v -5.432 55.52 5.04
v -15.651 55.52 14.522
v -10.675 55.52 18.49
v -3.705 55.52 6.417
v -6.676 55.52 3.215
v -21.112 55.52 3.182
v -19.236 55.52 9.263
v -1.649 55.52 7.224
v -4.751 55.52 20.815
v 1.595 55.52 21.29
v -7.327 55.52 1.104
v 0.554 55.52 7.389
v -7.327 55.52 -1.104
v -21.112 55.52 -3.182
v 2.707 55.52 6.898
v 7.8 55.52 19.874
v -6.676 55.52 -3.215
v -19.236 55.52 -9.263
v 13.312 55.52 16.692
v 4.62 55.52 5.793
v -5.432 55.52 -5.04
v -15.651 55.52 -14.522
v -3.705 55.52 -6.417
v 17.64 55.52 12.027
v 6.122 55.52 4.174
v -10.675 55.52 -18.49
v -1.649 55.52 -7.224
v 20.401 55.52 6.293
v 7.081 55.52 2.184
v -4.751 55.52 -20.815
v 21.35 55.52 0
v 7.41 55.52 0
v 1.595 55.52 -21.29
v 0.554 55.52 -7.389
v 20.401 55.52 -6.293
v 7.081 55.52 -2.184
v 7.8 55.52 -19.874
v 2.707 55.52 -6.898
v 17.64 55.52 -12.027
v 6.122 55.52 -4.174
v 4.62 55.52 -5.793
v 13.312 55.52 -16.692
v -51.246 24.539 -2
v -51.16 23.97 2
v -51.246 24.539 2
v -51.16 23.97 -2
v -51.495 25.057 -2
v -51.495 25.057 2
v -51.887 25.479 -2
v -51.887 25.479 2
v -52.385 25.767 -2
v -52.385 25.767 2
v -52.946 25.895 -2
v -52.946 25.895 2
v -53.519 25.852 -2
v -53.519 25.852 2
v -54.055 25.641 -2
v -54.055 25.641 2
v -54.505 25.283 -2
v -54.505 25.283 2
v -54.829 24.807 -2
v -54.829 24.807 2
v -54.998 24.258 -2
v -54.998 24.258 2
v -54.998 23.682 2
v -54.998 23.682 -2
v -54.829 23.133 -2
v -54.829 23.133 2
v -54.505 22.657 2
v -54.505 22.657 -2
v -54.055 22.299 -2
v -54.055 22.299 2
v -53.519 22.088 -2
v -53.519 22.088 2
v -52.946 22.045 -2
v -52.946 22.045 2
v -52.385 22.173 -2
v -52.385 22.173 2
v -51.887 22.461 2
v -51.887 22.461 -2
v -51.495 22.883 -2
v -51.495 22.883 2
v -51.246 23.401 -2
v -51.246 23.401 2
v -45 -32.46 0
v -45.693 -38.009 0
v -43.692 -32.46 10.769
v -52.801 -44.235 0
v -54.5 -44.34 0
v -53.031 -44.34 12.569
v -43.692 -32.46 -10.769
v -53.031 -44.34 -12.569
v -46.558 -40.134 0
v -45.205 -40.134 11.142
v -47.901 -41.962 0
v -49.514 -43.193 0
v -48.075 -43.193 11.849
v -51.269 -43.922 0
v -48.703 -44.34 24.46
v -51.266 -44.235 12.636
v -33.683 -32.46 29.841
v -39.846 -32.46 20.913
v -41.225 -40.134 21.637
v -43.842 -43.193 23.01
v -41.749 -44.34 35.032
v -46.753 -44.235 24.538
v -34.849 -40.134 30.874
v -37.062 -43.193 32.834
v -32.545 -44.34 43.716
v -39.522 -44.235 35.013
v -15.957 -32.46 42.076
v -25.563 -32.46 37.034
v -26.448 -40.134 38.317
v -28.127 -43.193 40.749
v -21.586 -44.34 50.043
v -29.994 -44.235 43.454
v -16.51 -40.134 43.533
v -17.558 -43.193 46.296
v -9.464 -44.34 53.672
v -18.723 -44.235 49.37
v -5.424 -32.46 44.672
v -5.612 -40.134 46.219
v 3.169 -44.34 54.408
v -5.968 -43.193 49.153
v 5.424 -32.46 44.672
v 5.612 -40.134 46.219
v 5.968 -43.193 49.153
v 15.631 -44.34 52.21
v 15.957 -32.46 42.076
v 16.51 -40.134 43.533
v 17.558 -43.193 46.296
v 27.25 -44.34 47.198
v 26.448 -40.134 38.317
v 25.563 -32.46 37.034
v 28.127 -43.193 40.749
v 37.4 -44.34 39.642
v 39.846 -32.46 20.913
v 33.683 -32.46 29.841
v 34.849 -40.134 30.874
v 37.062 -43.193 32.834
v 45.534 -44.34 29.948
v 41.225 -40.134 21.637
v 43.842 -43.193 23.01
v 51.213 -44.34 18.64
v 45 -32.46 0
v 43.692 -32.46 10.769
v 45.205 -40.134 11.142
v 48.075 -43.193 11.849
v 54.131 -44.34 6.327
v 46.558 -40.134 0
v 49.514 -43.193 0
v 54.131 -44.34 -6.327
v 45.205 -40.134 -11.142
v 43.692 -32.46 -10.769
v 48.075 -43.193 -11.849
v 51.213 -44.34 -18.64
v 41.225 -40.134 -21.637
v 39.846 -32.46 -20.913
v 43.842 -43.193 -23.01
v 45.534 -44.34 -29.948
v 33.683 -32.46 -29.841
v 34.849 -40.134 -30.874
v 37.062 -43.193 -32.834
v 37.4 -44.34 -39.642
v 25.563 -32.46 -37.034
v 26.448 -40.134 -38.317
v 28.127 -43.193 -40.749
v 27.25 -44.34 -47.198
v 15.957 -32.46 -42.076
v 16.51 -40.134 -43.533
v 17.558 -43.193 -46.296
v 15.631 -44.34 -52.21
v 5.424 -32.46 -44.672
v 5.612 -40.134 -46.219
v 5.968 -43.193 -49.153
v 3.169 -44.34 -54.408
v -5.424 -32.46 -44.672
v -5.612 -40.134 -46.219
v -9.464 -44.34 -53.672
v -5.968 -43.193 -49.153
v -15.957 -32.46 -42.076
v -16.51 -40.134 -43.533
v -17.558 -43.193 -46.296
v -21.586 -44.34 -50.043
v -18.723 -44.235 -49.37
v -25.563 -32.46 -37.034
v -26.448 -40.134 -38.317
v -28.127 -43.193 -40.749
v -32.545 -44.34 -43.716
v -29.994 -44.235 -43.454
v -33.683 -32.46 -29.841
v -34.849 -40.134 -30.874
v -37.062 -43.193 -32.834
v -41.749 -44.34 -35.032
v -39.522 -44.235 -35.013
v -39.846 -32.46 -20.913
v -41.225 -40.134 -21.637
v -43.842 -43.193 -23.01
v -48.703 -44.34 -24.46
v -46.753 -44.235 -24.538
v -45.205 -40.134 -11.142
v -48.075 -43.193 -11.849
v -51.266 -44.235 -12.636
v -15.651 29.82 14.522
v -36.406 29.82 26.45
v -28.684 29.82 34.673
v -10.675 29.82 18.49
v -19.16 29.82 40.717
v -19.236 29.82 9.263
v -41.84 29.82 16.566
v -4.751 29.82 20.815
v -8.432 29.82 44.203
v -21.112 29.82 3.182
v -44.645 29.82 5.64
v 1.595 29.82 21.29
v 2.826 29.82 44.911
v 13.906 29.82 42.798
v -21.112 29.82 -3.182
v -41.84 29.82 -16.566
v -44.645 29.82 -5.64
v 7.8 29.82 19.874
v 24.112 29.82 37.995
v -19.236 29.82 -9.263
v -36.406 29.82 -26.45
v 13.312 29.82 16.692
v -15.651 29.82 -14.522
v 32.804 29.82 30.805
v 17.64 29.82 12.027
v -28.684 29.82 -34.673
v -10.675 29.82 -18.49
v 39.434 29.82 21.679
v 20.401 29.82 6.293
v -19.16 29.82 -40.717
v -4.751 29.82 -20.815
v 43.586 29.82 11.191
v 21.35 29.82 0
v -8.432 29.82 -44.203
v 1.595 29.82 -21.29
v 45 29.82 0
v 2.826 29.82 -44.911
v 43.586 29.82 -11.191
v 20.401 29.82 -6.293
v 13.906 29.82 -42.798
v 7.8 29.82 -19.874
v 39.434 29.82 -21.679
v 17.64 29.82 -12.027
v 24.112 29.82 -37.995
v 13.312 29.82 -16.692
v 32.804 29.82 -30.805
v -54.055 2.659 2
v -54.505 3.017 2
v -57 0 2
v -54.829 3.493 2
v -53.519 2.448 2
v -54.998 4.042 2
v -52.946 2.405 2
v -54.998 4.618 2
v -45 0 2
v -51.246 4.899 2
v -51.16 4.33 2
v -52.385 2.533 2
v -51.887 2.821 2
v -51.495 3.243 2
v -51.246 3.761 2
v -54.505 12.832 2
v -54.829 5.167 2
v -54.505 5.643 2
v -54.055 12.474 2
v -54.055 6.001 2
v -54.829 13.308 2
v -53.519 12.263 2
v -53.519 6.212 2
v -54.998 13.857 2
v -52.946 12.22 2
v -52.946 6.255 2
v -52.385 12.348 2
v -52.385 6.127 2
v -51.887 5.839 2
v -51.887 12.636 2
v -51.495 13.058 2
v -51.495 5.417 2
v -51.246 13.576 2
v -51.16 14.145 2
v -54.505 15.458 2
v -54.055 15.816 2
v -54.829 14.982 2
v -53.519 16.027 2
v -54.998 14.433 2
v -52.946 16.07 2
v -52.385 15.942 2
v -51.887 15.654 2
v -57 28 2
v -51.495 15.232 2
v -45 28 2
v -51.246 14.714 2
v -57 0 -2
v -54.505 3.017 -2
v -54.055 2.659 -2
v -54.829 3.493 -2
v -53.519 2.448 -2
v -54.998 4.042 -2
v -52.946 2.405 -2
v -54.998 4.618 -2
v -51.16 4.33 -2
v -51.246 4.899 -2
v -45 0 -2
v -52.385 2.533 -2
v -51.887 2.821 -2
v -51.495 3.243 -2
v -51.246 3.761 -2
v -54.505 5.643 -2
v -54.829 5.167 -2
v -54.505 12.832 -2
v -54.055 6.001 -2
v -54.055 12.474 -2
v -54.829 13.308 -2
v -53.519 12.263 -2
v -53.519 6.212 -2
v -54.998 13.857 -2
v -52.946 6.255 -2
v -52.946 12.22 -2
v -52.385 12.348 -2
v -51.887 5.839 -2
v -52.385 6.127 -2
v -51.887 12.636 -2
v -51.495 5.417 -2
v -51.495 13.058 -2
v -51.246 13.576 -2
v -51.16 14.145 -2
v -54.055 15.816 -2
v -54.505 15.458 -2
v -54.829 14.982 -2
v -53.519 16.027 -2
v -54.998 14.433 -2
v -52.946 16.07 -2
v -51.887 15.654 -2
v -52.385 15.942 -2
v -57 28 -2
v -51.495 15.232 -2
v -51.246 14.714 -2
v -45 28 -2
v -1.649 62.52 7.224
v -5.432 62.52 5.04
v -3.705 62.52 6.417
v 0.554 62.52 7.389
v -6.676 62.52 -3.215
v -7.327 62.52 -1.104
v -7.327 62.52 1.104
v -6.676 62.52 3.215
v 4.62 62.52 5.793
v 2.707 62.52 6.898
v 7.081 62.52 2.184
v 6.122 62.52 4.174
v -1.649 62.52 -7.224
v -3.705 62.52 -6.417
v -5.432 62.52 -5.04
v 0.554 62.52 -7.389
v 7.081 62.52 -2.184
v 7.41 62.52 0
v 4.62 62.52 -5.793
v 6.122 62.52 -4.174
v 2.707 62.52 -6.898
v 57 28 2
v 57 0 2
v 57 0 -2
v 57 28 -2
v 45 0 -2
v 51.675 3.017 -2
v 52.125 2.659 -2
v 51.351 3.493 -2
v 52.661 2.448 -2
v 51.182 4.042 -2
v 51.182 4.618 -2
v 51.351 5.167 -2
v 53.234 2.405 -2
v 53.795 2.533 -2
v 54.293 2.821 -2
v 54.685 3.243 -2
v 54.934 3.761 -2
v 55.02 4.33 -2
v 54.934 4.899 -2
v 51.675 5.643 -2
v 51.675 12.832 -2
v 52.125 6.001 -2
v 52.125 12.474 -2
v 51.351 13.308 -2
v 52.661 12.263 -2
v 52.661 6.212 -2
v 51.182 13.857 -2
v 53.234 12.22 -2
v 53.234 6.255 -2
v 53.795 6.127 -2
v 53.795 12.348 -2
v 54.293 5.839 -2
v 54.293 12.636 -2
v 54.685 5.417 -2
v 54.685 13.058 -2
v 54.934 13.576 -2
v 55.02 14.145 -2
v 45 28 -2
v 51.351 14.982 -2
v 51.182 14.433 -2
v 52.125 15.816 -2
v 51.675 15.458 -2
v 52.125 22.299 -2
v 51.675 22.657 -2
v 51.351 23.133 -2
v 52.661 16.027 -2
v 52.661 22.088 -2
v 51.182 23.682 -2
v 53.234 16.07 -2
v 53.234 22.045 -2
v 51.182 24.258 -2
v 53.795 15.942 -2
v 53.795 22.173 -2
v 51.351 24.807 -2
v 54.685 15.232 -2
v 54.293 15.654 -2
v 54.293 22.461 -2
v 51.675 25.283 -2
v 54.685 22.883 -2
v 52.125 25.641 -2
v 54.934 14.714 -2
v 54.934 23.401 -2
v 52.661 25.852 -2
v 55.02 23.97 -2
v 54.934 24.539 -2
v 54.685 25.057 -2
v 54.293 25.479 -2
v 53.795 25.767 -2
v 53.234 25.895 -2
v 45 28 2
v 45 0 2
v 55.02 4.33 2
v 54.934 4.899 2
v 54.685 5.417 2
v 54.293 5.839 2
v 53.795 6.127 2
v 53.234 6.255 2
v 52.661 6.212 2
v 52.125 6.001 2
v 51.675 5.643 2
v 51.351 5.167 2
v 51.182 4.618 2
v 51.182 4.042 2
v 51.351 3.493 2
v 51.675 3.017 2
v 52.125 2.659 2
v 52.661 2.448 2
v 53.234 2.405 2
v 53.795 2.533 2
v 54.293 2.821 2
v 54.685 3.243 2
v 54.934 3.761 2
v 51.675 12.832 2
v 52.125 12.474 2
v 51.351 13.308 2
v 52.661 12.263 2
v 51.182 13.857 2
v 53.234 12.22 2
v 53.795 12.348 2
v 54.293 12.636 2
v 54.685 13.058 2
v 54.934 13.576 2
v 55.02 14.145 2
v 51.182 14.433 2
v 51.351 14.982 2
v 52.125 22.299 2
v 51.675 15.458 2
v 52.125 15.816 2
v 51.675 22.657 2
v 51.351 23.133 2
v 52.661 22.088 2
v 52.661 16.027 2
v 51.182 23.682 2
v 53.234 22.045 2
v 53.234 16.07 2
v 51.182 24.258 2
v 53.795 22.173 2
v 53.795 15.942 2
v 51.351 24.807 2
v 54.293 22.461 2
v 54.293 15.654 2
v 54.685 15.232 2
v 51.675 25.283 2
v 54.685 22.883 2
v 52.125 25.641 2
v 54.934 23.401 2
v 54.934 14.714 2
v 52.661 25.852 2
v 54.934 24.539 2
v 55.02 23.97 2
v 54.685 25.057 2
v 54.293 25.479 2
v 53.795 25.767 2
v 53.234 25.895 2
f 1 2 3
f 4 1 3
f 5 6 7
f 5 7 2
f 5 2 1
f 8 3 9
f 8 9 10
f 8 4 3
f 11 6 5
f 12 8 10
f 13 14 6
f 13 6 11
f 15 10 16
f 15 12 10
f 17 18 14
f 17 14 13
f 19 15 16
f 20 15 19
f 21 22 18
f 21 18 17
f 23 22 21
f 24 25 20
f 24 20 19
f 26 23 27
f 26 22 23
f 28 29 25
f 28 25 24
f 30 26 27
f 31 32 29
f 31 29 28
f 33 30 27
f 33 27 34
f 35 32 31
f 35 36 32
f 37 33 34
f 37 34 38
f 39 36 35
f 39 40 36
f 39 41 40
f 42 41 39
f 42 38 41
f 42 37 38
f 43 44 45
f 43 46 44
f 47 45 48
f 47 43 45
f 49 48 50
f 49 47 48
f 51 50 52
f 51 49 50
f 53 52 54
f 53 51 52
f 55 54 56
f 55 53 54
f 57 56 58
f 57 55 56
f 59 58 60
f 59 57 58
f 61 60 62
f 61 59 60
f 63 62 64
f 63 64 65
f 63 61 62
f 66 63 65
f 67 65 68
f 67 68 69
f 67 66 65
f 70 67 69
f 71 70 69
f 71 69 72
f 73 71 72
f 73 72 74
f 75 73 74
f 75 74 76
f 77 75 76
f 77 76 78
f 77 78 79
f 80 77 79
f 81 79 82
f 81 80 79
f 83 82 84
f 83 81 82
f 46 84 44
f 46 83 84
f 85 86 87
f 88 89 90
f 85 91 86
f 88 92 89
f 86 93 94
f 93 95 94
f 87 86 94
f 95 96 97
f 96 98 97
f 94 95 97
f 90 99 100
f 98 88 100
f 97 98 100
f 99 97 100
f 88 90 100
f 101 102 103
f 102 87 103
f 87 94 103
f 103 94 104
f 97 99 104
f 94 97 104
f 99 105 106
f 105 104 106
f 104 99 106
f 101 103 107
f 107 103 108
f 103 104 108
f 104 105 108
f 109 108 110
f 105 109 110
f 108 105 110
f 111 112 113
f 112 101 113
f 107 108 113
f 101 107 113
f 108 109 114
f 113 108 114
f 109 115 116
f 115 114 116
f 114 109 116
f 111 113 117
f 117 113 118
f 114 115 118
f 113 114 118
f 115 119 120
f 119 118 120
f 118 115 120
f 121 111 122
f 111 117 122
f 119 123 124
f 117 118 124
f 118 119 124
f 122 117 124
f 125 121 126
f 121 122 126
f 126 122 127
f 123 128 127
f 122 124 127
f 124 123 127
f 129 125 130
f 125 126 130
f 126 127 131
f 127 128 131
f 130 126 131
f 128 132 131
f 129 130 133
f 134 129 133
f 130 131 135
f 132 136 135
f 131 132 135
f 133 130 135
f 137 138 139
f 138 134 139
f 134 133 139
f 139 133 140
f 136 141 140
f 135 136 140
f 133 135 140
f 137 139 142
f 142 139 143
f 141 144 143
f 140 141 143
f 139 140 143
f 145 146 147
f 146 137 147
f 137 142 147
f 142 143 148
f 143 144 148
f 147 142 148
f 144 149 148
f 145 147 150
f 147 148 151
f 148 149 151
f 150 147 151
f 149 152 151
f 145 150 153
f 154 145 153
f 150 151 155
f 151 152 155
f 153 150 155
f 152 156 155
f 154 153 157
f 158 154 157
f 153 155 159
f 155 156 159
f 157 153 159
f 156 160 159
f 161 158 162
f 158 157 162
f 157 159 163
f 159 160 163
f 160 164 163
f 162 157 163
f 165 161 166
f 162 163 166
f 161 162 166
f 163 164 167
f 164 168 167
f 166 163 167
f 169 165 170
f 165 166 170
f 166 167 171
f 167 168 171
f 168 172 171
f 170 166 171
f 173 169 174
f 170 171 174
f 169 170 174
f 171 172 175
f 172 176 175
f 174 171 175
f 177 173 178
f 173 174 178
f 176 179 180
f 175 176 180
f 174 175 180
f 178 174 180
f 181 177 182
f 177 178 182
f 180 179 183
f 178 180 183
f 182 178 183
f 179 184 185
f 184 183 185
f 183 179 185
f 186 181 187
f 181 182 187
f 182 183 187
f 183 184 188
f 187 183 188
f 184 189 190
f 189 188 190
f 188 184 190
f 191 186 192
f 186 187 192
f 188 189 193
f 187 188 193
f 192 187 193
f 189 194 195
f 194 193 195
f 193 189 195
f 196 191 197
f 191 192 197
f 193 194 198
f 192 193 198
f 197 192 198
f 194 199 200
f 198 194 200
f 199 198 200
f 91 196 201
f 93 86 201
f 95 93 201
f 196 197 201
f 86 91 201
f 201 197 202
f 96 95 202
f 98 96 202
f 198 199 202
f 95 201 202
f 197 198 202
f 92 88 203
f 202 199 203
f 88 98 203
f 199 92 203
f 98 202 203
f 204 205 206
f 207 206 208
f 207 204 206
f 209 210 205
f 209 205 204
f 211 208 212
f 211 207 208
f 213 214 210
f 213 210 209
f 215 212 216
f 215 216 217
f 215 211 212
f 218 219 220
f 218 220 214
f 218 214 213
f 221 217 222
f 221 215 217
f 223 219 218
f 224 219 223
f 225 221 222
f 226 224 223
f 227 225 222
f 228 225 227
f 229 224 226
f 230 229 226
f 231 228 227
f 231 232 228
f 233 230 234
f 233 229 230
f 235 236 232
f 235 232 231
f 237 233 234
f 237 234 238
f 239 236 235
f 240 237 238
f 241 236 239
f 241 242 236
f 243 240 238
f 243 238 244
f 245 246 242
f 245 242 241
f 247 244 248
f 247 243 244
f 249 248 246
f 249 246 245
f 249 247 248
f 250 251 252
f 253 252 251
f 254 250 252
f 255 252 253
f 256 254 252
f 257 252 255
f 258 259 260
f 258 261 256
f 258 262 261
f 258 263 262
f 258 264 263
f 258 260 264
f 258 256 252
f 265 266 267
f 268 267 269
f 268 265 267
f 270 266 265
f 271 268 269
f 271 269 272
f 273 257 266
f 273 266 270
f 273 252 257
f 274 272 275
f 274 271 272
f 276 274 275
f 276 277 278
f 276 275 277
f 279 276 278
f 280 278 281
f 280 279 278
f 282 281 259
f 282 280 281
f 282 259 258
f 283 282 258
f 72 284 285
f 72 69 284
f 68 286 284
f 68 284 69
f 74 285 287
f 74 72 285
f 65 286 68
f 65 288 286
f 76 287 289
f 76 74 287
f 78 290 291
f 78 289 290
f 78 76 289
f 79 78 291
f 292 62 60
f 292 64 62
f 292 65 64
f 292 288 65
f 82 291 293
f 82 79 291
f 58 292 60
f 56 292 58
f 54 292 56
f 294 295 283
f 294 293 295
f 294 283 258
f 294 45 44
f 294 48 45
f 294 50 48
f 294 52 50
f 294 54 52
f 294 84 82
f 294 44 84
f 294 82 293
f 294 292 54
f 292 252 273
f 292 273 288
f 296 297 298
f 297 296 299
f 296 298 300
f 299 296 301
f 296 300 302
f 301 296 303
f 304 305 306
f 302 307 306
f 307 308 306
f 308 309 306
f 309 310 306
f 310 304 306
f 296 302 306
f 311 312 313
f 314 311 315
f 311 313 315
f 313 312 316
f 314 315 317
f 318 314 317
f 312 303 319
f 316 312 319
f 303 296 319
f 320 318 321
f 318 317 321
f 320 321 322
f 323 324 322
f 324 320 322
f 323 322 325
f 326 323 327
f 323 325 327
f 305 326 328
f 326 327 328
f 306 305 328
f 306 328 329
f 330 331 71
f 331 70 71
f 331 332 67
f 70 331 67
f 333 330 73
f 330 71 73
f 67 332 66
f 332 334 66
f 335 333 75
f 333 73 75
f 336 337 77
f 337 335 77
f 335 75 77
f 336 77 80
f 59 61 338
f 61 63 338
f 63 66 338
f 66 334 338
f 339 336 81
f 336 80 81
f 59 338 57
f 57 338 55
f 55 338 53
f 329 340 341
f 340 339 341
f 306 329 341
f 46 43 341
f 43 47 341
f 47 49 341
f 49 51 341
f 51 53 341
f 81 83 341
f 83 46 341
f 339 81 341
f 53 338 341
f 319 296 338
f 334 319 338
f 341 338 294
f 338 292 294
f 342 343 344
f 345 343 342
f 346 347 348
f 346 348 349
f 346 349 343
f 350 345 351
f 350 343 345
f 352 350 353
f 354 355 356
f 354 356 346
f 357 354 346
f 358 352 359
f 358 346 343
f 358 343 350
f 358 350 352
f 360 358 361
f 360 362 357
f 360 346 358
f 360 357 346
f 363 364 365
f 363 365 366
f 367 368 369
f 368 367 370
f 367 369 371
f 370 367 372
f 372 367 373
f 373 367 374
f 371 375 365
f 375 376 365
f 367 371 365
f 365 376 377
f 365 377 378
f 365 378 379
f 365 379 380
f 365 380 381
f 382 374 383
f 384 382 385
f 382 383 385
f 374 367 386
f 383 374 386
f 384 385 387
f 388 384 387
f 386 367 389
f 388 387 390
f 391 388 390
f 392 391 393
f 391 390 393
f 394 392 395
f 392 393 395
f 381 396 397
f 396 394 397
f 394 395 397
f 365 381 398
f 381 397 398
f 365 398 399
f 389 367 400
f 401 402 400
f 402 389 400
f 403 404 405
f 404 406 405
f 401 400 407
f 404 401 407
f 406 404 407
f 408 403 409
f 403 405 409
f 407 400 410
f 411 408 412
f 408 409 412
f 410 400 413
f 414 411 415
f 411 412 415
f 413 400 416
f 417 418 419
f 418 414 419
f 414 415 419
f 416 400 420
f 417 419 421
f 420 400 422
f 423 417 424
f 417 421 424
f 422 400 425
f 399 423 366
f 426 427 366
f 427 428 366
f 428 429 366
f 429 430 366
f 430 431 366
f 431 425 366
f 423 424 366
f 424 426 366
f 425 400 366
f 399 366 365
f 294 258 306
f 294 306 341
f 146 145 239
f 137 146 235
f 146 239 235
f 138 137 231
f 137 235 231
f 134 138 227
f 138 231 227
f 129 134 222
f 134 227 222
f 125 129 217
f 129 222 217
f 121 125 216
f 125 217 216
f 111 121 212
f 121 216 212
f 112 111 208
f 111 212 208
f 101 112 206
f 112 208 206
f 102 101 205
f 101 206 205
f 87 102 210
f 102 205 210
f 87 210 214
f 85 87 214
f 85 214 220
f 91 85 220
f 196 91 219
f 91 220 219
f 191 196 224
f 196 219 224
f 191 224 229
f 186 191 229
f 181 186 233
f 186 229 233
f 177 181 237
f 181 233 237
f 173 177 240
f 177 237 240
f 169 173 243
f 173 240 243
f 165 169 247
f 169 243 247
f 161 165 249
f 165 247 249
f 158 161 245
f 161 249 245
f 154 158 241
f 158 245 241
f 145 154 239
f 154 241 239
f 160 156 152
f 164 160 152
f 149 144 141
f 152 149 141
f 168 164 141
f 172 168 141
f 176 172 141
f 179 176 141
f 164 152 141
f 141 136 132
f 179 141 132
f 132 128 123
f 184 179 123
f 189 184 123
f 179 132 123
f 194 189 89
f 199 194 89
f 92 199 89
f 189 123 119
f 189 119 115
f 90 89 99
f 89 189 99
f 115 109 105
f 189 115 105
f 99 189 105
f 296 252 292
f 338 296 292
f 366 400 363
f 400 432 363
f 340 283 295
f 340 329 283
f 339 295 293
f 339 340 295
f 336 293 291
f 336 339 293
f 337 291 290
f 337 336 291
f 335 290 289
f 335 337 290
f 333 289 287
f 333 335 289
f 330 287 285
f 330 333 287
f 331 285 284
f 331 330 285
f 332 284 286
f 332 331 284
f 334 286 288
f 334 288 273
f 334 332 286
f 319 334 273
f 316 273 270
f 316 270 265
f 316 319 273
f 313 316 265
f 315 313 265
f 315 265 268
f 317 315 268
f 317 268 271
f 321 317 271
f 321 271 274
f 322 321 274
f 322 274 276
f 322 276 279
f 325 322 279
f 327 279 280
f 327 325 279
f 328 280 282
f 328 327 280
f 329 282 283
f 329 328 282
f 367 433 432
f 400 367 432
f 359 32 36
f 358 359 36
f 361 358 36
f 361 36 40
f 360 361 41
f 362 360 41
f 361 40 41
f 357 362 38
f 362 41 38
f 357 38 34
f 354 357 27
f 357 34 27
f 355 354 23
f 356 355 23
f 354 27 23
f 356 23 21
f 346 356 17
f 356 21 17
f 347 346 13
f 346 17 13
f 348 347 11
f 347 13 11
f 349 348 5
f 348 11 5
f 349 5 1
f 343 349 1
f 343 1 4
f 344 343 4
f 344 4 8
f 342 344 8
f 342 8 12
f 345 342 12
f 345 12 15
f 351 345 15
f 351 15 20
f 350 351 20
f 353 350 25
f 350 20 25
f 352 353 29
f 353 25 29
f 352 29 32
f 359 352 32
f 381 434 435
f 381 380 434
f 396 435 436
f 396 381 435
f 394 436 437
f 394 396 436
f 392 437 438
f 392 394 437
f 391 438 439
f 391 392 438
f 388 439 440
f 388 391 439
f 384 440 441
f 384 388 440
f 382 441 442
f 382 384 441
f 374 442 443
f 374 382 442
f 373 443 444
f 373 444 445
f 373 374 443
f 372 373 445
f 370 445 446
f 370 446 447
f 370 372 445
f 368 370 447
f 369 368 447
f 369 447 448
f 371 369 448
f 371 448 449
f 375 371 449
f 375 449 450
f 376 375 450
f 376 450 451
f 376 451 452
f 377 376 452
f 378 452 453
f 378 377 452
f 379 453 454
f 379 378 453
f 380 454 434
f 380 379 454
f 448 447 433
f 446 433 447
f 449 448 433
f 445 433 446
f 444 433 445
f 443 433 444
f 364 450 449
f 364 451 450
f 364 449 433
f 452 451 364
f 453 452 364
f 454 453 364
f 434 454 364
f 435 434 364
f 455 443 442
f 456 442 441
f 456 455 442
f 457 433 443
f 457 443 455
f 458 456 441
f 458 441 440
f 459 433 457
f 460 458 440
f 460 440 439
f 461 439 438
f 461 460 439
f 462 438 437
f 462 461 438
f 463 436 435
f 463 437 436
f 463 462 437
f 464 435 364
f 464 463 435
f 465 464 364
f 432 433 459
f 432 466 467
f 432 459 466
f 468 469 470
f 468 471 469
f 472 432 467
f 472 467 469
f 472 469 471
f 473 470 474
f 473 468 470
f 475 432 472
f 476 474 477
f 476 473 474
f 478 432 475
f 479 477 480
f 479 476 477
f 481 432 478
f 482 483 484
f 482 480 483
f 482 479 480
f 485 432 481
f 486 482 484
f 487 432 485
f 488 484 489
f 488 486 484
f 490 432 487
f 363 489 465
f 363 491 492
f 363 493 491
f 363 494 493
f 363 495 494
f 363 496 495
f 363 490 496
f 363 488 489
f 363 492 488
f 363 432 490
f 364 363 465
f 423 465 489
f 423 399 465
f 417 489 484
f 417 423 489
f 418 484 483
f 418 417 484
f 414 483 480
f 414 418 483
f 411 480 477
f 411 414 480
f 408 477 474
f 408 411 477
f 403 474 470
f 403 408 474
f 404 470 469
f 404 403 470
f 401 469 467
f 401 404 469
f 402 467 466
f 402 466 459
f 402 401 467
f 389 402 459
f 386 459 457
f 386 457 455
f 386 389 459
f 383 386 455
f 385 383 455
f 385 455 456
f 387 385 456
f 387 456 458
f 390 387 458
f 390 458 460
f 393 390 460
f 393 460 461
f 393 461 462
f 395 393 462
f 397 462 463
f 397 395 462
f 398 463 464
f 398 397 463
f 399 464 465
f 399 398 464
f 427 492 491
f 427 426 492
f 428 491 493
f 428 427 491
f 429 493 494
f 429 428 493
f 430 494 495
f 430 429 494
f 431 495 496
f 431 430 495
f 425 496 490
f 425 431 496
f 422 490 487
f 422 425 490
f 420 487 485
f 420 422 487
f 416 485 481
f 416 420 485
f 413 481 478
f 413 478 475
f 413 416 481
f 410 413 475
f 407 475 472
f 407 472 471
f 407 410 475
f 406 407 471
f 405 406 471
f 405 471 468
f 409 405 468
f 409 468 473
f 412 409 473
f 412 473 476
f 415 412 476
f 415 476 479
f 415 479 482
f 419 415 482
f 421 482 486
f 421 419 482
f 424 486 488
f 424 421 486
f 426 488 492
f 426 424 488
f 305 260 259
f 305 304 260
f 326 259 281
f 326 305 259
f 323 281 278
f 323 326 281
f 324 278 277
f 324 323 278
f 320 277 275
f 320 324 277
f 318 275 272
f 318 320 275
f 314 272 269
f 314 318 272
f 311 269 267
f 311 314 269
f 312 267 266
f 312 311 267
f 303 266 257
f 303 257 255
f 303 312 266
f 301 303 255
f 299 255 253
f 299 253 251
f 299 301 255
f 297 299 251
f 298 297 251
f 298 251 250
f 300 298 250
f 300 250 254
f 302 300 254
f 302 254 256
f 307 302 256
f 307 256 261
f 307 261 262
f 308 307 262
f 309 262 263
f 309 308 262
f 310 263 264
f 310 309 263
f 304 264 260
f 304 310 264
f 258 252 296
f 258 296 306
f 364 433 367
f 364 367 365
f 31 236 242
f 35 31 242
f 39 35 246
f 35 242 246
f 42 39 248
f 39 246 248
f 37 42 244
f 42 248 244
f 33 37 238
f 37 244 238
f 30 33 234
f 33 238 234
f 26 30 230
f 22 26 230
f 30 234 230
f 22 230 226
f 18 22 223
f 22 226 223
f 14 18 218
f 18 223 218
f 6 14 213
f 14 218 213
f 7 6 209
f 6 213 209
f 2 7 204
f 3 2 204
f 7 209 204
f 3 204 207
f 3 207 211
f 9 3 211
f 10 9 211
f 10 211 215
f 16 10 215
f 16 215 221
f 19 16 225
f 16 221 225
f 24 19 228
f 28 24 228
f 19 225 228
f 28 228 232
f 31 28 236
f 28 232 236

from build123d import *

# Parameters (mm, degrees)
SKETCH_1_R        = 45
EXTRUDE_1_DEPTH   = 29.82
SKETCH_2_W        = 12
SKETCH_2_H        = 28
SKETCH_2_R        = 1.93
EXTRUDE_2_DEPTH   = 2
EXTRUDE_2_2_DEPTH = 2
SKETCH_3_R        = 21.35
EXTRUDE_3_DEPTH   = 25.7
SKETCH_4_R        = 7.41
EXTRUDE_4_DEPTH   = 7
SKETCH_5_R        = 45
EXTRUDE_5_DEPTH   = 32.46


with BuildPart() as part:
    # 草图1 → 凸台-拉伸1 (new body)
    with BuildSketch(Plane(origin=(0, 0, 0), x_dir=(1, 0, 0), z_dir=(0, 1, 0))):
        Circle(SKETCH_1_R)
    extrude(amount=EXTRUDE_1_DEPTH)

    # 草图3 → 凸台-拉伸3 (add)
    with BuildSketch(Plane(origin=(0, 29.82, 0), x_dir=(1, 0, 0), z_dir=(0, 1, 0))):
        Circle(SKETCH_3_R)
    extrude(amount=EXTRUDE_3_DEPTH)

    # 草图4 → 凸台-拉伸4 (add)
    with BuildSketch(Plane(origin=(0, 55.52, 0), x_dir=(1, 0, 0), z_dir=(0, 1, 0))):
        Circle(SKETCH_4_R)
    extrude(amount=EXTRUDE_4_DEPTH)

    # 草图5 → 凸台-拉伸5 (add)
    with BuildSketch(Plane.XZ):
        Circle(SKETCH_5_R)
    extrude(amount=EXTRUDE_5_DEPTH)

    # 草图6 → 旋转1 (revolve)
    with BuildSketch(Plane.XY):
        with BuildLine():
            Line((-54.5, -44.34), (0, -44.34))
            Line((0, -44.34), (0, -32.46))
            Line((0, -32.46), (-45, -32.46))
            add(Edge.make_bspline(
                [(-45, -32.46), (-45, -44.34), (-54.5, -44.34)],
                knots=[0, 0, 0, 1, 1, 1], degree=2))
        make_face()
    revolve(axis=Axis((0, -44.34, 0), (0, 1, 0)))


with BuildPart() as body_2:
    # 草图2 → 凸台-拉伸2 (new body, symmetric)
    with BuildSketch(Plane.XY):
        with Locations((51, 14)):
            Rectangle(SKETCH_2_W, SKETCH_2_H)
        with Locations((53.09, 23.97)):
            Circle(SKETCH_2_R, mode=Mode.SUBTRACT)
        with Locations((53.09, 14.145)):
            Circle(SKETCH_2_R, mode=Mode.SUBTRACT)
        with Locations((53.09, 4.33)):
            Circle(SKETCH_2_R, mode=Mode.SUBTRACT)
    extrude(amount=EXTRUDE_2_DEPTH, both=True)


with BuildPart() as body_3:
    # 草图2 → Extrude 2 2 (new body, symmetric)
    with BuildSketch(Plane.XY):
        with Locations((-51, 14)):
            Rectangle(SKETCH_2_W, SKETCH_2_H)
        with Locations((-53.09, 4.33)):
            Circle(SKETCH_2_R, mode=Mode.SUBTRACT)
        with Locations((-53.09, 14.145)):
            Circle(SKETCH_2_R, mode=Mode.SUBTRACT)
        with Locations((-53.09, 23.97)):
            Circle(SKETCH_2_R, mode=Mode.SUBTRACT)
    extrude(amount=EXTRUDE_2_2_DEPTH, both=True)


solid = Compound([part.part, body_2.part, body_3.part])
